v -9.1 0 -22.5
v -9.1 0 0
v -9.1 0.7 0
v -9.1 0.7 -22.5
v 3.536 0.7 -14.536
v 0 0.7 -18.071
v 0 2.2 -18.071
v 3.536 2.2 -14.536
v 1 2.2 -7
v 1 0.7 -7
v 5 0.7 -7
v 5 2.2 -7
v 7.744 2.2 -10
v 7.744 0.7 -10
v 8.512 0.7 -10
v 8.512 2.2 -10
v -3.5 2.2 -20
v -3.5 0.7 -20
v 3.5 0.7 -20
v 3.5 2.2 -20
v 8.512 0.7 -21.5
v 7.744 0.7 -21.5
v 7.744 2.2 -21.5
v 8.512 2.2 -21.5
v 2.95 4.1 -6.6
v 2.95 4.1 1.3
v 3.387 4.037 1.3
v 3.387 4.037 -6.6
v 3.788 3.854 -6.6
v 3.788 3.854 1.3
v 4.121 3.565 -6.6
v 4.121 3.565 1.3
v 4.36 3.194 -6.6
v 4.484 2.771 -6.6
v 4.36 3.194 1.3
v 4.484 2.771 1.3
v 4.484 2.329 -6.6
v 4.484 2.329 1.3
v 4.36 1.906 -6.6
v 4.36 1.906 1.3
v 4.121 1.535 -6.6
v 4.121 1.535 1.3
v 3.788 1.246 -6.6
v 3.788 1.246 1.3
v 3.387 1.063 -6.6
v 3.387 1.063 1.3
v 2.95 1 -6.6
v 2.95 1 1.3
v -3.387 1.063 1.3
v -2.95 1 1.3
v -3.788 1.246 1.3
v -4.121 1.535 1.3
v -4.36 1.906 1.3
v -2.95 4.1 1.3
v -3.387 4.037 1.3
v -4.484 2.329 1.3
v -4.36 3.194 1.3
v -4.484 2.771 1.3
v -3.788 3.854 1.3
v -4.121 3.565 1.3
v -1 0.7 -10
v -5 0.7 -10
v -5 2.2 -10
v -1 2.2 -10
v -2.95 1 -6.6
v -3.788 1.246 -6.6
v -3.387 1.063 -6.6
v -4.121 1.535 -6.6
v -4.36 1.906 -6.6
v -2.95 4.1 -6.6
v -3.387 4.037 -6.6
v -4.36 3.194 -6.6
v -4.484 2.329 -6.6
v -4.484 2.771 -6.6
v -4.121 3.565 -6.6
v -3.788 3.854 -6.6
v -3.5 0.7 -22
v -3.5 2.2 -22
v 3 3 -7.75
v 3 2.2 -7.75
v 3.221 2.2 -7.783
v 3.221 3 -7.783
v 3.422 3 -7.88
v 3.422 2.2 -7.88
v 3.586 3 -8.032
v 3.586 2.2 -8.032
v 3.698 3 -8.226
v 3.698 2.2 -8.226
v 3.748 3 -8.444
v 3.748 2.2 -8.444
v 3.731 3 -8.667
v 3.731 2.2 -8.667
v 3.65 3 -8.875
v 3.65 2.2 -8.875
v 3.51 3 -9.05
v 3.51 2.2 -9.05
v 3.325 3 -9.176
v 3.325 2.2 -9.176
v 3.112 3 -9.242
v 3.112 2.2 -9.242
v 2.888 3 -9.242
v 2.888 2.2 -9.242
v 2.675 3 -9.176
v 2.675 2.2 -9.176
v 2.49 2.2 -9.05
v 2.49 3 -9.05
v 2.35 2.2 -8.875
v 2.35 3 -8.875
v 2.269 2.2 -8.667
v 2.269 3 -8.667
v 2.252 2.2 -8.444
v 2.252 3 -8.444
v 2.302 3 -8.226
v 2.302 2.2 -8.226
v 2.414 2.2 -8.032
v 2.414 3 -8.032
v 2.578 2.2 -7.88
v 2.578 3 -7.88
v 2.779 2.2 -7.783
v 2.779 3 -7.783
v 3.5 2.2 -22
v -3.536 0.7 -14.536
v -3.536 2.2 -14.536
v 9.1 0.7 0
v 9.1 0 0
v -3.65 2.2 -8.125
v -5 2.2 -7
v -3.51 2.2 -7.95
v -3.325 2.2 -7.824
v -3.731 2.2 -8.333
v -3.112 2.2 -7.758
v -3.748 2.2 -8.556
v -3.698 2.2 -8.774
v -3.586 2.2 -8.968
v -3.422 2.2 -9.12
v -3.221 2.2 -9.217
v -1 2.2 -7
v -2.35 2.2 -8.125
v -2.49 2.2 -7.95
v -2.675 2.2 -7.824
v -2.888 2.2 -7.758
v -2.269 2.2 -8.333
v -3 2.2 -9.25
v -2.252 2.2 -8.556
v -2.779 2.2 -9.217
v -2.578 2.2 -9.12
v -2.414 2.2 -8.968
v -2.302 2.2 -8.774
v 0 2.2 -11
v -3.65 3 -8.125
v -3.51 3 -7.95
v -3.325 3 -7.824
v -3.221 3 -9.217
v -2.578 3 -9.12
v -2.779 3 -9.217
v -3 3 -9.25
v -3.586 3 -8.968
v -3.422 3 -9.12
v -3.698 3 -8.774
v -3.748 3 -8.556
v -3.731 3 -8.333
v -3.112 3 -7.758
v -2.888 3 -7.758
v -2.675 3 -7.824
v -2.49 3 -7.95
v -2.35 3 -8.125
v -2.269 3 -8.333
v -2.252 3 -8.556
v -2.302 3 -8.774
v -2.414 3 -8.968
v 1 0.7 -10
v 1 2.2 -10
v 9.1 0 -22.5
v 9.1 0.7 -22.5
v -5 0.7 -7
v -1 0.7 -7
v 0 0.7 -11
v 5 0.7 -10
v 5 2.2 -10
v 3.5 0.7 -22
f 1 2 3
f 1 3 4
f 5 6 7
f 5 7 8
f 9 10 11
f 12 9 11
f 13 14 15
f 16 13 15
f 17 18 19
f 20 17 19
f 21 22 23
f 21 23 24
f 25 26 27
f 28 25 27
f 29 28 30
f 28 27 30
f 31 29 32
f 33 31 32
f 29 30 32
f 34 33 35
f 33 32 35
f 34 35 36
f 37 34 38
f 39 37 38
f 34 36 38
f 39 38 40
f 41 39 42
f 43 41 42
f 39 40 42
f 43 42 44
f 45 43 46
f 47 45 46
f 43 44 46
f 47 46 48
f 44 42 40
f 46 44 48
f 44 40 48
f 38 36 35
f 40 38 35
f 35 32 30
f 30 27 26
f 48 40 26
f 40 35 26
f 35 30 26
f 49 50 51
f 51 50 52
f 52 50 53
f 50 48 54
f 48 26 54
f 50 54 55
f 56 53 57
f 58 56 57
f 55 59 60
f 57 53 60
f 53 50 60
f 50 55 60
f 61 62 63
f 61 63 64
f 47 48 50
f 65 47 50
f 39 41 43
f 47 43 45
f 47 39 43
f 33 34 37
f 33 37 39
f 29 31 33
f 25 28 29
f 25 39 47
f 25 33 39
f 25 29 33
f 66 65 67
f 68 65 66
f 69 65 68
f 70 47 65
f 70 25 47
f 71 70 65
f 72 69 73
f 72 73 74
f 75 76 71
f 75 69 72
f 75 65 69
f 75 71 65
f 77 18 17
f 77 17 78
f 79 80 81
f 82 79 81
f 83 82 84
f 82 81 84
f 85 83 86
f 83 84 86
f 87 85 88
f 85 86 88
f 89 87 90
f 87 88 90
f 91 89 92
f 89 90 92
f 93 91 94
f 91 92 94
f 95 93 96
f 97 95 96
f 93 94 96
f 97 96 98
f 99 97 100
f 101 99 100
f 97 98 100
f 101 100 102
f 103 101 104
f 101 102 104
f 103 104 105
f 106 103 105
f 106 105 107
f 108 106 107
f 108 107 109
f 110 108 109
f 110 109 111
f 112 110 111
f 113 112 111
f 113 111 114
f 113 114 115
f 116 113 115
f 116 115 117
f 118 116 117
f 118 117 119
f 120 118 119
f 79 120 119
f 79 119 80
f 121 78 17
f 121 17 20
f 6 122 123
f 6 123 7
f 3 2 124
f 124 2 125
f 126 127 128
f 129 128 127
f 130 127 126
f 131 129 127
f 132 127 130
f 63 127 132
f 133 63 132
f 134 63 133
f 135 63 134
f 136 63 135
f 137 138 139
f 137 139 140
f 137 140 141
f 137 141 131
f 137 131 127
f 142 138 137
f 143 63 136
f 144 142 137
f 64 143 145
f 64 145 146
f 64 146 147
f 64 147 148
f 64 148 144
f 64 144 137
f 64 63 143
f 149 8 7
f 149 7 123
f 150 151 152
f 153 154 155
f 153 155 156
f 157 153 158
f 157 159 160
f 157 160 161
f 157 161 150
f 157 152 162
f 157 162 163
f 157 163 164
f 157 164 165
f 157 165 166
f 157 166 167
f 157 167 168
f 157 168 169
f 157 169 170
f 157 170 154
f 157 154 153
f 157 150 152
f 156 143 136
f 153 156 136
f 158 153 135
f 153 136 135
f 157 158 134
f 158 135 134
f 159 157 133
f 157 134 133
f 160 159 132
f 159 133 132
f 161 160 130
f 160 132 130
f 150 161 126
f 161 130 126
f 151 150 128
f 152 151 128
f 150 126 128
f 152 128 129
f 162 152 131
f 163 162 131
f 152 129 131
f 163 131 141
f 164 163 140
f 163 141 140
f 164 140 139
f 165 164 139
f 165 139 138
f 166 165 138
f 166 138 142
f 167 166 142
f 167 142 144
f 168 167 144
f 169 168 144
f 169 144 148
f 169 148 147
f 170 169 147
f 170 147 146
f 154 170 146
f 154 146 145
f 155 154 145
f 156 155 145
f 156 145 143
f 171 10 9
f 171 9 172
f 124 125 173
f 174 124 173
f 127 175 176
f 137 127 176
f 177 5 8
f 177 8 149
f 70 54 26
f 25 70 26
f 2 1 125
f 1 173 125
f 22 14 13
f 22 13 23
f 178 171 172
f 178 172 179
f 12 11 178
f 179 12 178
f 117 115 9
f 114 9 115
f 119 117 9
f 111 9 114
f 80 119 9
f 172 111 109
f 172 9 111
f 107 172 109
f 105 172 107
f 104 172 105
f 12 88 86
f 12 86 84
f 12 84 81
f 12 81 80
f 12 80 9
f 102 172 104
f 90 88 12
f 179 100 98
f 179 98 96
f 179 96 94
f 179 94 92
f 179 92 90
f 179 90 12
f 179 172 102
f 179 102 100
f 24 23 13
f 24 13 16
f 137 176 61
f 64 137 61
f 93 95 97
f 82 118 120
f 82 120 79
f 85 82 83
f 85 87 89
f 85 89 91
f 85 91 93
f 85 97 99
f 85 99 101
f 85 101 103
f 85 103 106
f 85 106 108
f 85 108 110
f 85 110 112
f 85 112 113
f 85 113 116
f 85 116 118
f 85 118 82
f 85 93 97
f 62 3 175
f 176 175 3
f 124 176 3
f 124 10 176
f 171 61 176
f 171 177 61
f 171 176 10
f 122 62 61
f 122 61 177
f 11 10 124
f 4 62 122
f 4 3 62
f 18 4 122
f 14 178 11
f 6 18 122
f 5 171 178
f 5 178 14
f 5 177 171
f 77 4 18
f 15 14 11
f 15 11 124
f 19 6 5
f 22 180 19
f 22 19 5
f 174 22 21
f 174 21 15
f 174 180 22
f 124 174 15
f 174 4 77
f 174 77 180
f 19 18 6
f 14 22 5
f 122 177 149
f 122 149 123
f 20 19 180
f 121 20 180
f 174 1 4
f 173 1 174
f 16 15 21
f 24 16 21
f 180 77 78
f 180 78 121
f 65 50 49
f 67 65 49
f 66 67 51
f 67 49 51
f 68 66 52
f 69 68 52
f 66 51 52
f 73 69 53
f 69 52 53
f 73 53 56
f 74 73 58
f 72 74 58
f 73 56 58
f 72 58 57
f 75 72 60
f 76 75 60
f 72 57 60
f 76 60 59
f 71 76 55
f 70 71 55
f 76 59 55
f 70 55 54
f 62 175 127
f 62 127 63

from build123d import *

# Parameters (mm, degrees)
SKETCH_1_W      = 18.2
SKETCH_1_H      = 22.5
EXTRUDE_1_DEPTH = 0.7
EXTRUDE_START   = 1.3
EXTRUDE_2_DEPTH = 7.9
SKETCH_3_W      = 4
SKETCH_3_H      = 3
SKETCH_3_W_2    = 7
SKETCH_3_H_2    = 2
SKETCH_3_W_3    = 0.768063184
SKETCH_3_H_3    = 11.5
EXTRUDE_3_DEPTH = 2.2
SKETCH_4_R      = 0.75
EXTRUDE_4_DEPTH = 3


with BuildPart() as part:
    # Эскиз1 → Бобышка-Вытянуть1 (new body)
    with BuildSketch(Plane(origin=(0, 0, 0), x_dir=(1, 0, 0), z_dir=(0, 1, 0))):
        with Locations((0, 11.25)):
            Rectangle(SKETCH_1_W, SKETCH_1_H)
    extrude(amount=EXTRUDE_1_DEPTH)

    # Эскиз3 → Бобышка-Вытянуть3 (add)
    with BuildSketch(Plane(origin=(0, 0, 0), x_dir=(1, 0, 0), z_dir=(0, 1, 0))):
        Polygon((-3.535533906, 14.535533906), (0, 18.071067812), (3.535533906, 14.535533906), (0, 11), align=None)
        with Locations((-3, 8.5)):
            Rectangle(SKETCH_3_W, SKETCH_3_H)
        with Locations((3, 8.5)):
            Rectangle(SKETCH_3_W, SKETCH_3_H)
        with Locations((0, 21)):
            Rectangle(SKETCH_3_W_2, SKETCH_3_H_2)
        with Locations((8.127829454, 15.75)):
            Rectangle(SKETCH_3_W_3, SKETCH_3_H_3)
    extrude(amount=EXTRUDE_3_DEPTH)

    # Эскиз4 → Бобышка-Вытянуть4 (add)
    with BuildSketch(Plane(origin=(0, 0, 0), x_dir=(1, 0, 0), z_dir=(0, 1, 0))):
        with Locations(Location((3, 8.5, 0), (0, 0, 270))):
            Circle(SKETCH_4_R)
        with Locations(Location((-3, 8.5, 0), (0, 0, 90))):
            Circle(SKETCH_4_R)
    extrude(amount=EXTRUDE_4_DEPTH)


with BuildPart() as body_2:
    # Эскиз2 → Бобышка-Вытянуть2 (new body)
    with BuildSketch(Plane.XY.offset(EXTRUDE_START)):
        with BuildLine():
            Line((-2.95, 4.1), (2.95, 4.1))
            ThreePointArc((2.95, 4.1), (4.5, 2.55), (2.95, 1))
            Line((2.95, 1), (-2.95, 1))
            ThreePointArc((-2.95, 1), (-4.5, 2.55), (-2.95, 4.1))
        make_face()
    extrude(amount=-EXTRUDE_2_DEPTH)


solid = Compound([part.part, body_2.part])
